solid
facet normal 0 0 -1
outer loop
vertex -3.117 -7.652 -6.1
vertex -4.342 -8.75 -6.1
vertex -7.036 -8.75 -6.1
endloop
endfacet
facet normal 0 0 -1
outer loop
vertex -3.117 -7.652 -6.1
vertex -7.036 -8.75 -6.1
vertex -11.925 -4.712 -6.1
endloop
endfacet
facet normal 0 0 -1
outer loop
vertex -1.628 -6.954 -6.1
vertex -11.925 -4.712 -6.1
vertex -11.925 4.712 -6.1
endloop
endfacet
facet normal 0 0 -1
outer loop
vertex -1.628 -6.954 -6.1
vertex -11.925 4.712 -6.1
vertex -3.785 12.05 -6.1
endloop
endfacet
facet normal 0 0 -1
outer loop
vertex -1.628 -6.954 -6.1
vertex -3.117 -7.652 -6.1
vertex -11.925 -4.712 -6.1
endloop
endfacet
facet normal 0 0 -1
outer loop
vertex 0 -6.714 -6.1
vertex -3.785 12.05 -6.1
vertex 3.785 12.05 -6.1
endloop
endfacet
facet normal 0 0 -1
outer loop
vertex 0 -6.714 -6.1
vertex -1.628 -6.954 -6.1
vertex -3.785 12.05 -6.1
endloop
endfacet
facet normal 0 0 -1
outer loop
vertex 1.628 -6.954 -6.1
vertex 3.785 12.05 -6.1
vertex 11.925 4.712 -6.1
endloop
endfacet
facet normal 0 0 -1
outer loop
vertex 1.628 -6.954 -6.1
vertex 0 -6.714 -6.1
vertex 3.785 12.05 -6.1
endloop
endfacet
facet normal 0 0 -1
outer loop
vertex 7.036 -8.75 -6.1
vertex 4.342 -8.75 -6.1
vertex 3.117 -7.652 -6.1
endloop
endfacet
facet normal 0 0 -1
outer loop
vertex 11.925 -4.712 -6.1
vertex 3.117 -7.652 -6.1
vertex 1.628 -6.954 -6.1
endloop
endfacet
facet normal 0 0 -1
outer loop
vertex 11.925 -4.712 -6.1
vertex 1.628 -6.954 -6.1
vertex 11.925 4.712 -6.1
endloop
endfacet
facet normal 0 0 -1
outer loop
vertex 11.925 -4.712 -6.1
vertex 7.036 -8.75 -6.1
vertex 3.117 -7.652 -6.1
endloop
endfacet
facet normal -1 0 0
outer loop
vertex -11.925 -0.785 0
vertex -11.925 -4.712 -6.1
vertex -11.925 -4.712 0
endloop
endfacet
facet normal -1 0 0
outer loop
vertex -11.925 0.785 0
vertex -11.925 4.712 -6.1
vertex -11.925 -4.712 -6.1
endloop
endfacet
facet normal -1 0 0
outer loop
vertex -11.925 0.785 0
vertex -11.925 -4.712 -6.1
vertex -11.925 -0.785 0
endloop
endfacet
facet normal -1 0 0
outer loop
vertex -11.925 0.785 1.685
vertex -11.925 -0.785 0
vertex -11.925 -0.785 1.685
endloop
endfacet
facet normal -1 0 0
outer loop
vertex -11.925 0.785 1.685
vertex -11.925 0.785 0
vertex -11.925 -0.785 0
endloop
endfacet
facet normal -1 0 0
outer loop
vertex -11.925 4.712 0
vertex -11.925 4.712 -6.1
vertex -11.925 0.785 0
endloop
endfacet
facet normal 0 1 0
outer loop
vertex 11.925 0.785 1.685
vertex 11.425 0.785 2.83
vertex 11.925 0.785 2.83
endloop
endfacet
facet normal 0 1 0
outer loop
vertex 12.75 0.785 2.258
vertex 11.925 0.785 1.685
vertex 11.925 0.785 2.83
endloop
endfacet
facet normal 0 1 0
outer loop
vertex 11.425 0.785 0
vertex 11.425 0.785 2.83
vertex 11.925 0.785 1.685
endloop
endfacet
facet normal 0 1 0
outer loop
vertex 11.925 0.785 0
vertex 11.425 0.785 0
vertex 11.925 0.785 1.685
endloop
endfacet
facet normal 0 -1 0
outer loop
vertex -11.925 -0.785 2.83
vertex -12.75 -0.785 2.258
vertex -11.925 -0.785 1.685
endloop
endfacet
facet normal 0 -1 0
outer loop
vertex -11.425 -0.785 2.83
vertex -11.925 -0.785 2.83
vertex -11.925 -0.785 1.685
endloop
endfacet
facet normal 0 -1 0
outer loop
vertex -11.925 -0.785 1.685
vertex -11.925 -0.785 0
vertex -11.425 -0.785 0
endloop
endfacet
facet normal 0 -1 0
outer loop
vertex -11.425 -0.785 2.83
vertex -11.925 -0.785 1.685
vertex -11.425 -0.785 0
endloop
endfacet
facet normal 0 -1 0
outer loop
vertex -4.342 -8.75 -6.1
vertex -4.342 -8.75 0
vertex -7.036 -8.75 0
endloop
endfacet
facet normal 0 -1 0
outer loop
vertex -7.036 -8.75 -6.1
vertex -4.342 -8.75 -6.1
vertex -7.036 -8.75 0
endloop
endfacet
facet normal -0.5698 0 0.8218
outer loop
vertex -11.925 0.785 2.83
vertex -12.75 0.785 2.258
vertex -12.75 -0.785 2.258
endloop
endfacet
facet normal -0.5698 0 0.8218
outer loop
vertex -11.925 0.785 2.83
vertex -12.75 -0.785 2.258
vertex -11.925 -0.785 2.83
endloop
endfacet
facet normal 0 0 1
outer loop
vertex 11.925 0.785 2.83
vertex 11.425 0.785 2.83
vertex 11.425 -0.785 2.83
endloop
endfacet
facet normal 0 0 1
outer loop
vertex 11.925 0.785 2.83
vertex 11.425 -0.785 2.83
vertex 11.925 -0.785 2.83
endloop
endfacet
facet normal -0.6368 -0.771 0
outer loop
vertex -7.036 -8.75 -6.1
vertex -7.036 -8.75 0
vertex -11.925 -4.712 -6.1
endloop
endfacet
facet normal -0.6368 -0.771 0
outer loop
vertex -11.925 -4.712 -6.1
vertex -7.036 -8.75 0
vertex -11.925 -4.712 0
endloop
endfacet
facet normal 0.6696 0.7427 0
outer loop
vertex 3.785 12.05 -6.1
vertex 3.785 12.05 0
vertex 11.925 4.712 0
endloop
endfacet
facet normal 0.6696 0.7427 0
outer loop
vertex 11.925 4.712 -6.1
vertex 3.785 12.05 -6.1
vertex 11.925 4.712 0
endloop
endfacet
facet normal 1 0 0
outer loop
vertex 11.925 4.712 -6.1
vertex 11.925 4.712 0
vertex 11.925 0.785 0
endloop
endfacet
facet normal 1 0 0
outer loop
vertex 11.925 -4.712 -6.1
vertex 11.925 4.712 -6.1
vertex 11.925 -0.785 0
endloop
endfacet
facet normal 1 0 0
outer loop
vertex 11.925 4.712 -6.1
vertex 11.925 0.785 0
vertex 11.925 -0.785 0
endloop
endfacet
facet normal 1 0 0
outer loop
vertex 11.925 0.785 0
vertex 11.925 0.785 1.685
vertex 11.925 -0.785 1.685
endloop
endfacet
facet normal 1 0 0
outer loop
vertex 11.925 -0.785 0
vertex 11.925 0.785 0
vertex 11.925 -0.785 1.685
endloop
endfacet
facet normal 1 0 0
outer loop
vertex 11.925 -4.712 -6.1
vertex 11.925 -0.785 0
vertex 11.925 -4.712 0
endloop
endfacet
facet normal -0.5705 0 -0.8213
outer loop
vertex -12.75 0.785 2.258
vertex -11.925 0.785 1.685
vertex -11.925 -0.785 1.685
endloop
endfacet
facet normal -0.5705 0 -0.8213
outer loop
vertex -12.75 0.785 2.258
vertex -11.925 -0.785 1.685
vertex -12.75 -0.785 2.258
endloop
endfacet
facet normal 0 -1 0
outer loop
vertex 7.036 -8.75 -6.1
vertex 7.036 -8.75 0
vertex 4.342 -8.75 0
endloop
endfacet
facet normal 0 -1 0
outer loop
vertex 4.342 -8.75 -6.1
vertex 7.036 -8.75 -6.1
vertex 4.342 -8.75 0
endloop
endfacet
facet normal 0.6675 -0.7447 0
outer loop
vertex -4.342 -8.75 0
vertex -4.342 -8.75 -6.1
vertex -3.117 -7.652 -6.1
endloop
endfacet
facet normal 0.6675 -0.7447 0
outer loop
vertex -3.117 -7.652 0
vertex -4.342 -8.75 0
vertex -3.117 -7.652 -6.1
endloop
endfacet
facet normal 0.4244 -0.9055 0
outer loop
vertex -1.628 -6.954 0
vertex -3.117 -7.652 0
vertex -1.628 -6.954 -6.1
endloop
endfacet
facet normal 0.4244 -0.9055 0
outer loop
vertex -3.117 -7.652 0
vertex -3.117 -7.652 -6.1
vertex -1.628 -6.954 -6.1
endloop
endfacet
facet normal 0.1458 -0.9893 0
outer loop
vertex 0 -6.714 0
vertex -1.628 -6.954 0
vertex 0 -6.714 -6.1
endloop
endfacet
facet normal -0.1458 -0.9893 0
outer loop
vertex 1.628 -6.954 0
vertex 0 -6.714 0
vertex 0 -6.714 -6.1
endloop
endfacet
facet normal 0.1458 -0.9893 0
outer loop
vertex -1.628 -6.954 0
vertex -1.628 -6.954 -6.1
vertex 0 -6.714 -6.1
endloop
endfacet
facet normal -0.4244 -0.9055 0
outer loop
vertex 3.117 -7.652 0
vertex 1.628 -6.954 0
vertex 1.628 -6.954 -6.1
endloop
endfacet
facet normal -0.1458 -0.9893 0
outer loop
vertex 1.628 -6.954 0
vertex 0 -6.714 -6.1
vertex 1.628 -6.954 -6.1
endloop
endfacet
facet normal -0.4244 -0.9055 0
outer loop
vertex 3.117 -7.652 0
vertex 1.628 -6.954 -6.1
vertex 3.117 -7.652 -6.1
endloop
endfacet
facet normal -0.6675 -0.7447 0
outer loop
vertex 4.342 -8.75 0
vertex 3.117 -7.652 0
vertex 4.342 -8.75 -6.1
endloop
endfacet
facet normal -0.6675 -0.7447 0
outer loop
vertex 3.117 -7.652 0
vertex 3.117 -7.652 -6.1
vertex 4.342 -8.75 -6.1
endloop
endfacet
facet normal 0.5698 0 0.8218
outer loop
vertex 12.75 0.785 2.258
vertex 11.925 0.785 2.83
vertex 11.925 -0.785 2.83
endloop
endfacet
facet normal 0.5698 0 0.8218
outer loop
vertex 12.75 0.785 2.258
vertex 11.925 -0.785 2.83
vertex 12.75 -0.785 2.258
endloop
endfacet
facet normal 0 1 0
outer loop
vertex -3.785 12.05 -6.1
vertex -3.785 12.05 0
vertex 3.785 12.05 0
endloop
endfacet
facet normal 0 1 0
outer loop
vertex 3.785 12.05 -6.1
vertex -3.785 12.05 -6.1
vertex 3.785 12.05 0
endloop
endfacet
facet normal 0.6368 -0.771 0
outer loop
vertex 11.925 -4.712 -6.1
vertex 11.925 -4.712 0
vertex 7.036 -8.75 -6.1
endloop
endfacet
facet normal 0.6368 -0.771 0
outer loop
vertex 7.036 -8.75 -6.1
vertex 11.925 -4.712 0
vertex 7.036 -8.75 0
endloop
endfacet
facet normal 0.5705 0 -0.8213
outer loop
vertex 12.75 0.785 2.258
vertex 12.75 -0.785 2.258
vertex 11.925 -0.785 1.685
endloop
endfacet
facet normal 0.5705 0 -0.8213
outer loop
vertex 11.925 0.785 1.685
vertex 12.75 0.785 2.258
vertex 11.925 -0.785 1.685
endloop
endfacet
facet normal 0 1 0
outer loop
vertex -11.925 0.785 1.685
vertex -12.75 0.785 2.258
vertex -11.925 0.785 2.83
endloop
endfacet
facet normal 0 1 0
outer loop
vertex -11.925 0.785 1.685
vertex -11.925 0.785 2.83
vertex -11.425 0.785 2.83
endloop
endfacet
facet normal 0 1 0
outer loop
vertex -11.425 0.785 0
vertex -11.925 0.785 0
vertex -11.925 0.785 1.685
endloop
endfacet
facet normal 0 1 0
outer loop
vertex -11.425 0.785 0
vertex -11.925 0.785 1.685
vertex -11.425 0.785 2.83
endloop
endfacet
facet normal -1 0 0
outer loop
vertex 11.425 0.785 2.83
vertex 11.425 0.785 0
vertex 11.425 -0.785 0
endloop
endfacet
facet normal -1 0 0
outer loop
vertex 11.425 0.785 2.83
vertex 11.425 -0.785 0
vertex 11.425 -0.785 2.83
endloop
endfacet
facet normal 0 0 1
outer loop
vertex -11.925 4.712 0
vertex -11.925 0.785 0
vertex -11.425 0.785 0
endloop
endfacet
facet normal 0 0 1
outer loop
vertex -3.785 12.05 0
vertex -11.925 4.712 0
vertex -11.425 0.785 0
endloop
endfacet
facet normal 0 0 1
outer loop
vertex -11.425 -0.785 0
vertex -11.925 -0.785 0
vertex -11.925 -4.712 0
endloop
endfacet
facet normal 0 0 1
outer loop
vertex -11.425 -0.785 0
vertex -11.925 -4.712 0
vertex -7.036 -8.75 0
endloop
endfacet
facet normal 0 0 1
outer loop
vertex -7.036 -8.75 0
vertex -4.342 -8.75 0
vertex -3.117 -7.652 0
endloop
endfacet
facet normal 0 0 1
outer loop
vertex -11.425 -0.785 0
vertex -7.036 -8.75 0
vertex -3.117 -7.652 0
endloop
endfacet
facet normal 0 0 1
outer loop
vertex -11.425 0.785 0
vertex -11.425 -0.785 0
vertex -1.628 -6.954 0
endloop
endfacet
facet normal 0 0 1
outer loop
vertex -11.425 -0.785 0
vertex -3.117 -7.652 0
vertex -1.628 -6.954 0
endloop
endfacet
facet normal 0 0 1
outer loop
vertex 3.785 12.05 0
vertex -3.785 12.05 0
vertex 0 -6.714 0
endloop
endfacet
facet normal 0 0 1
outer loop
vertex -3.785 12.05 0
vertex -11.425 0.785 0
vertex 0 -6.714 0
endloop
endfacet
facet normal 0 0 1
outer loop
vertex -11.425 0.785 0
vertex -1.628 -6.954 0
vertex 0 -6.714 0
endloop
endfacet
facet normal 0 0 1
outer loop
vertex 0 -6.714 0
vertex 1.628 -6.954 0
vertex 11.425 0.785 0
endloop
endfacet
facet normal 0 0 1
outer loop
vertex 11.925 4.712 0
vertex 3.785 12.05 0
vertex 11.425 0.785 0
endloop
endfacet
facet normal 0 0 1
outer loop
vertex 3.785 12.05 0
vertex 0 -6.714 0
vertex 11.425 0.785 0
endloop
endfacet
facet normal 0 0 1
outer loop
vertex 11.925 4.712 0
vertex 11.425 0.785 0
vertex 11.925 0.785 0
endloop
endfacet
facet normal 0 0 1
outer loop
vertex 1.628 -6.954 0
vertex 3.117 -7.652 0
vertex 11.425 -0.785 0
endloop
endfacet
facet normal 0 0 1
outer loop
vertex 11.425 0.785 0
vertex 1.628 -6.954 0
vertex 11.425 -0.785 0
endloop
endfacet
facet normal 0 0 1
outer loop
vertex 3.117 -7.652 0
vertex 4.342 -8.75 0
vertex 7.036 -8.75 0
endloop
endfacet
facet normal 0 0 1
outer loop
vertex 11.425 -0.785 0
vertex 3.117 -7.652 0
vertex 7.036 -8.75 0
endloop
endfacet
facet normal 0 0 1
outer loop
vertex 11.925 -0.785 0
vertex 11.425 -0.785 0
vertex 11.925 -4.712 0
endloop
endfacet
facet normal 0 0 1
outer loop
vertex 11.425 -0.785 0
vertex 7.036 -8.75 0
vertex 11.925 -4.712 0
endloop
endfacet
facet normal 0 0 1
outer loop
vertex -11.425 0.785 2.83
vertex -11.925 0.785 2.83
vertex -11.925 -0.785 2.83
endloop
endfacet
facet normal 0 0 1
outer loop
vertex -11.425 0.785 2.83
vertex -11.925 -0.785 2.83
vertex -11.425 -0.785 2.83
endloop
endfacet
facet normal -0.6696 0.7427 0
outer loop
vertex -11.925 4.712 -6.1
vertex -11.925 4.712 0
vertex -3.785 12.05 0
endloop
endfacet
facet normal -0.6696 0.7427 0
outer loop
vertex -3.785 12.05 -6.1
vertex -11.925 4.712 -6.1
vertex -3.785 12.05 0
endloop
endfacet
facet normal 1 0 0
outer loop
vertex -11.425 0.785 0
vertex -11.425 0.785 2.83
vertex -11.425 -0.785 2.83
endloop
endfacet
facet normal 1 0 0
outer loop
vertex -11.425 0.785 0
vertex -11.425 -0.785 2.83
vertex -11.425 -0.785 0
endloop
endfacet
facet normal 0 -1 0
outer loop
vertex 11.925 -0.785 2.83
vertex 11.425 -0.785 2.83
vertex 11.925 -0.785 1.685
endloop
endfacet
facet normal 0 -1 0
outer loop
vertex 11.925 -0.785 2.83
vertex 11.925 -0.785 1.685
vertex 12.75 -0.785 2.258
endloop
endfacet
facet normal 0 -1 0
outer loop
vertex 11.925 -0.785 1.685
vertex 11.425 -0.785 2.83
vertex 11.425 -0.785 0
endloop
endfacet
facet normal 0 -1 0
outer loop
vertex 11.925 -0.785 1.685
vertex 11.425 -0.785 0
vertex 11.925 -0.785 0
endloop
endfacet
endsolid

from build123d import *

# Parameters (mm, degrees)
F1_DEPTH      = 6.1
F3_DEPTH      = 0.785
F3_DEPTH_BACK = 0.785
F5_DEPTH      = 8.931
F6_ANGLE      = 180


with BuildPart() as f1:
    # F0 (on Top) → F1 (new body)
    with BuildSketch(Plane.XY):
        Polygon((-7.0355, 8.75), (-11.925, 4.7117), (-11.925, -4.7117), (-3.785, -12.05), (3.785, -12.05), (11.925, -4.7117), (11.925, 4.7117), (7.0355, 8.75), align=None)
    extrude(amount=F1_DEPTH)

    # F2 (on Front) → F3 (join, two sides)
    with BuildSketch(Plane.XZ) as f3_sk:
        Polygon((-11.425, 0), (-11.925, 0), (-11.925, -1.6852878034), (-12.75, -2.2576439017), (-11.925, -2.83), (-11.425, -2.83), align=None)
        Polygon((11.925, -1.6852878034), (11.925, 0), (11.425, 0), (11.425, -2.83), (11.925, -2.83), (12.75, -2.2576439017), align=None)
    extrude(amount=F3_DEPTH)
    extrude(f3_sk.sketch, amount=-F3_DEPTH_BACK)

    # F4 (on face) → F5 (cut, through all)
    with BuildSketch(Plane.XY.offset(6.1)):
        with BuildLine():
            Line((4.342041453, 8.75), (-4.342041453, 8.75))
            ThreePointArc((-4.342041453, 8.75), (0, 6.7139288477), (4.342041453, 8.75))
        make_face()
    extrude(amount=-F5_DEPTH, mode=Mode.SUBTRACT)


with BuildPart() as f1_1:
    # F6: moved
    add(f1.part.rotate(Axis((-2.2744432418, 0, 0), (1, 0, 0)), F6_ANGLE))


solid = f1_1.part
